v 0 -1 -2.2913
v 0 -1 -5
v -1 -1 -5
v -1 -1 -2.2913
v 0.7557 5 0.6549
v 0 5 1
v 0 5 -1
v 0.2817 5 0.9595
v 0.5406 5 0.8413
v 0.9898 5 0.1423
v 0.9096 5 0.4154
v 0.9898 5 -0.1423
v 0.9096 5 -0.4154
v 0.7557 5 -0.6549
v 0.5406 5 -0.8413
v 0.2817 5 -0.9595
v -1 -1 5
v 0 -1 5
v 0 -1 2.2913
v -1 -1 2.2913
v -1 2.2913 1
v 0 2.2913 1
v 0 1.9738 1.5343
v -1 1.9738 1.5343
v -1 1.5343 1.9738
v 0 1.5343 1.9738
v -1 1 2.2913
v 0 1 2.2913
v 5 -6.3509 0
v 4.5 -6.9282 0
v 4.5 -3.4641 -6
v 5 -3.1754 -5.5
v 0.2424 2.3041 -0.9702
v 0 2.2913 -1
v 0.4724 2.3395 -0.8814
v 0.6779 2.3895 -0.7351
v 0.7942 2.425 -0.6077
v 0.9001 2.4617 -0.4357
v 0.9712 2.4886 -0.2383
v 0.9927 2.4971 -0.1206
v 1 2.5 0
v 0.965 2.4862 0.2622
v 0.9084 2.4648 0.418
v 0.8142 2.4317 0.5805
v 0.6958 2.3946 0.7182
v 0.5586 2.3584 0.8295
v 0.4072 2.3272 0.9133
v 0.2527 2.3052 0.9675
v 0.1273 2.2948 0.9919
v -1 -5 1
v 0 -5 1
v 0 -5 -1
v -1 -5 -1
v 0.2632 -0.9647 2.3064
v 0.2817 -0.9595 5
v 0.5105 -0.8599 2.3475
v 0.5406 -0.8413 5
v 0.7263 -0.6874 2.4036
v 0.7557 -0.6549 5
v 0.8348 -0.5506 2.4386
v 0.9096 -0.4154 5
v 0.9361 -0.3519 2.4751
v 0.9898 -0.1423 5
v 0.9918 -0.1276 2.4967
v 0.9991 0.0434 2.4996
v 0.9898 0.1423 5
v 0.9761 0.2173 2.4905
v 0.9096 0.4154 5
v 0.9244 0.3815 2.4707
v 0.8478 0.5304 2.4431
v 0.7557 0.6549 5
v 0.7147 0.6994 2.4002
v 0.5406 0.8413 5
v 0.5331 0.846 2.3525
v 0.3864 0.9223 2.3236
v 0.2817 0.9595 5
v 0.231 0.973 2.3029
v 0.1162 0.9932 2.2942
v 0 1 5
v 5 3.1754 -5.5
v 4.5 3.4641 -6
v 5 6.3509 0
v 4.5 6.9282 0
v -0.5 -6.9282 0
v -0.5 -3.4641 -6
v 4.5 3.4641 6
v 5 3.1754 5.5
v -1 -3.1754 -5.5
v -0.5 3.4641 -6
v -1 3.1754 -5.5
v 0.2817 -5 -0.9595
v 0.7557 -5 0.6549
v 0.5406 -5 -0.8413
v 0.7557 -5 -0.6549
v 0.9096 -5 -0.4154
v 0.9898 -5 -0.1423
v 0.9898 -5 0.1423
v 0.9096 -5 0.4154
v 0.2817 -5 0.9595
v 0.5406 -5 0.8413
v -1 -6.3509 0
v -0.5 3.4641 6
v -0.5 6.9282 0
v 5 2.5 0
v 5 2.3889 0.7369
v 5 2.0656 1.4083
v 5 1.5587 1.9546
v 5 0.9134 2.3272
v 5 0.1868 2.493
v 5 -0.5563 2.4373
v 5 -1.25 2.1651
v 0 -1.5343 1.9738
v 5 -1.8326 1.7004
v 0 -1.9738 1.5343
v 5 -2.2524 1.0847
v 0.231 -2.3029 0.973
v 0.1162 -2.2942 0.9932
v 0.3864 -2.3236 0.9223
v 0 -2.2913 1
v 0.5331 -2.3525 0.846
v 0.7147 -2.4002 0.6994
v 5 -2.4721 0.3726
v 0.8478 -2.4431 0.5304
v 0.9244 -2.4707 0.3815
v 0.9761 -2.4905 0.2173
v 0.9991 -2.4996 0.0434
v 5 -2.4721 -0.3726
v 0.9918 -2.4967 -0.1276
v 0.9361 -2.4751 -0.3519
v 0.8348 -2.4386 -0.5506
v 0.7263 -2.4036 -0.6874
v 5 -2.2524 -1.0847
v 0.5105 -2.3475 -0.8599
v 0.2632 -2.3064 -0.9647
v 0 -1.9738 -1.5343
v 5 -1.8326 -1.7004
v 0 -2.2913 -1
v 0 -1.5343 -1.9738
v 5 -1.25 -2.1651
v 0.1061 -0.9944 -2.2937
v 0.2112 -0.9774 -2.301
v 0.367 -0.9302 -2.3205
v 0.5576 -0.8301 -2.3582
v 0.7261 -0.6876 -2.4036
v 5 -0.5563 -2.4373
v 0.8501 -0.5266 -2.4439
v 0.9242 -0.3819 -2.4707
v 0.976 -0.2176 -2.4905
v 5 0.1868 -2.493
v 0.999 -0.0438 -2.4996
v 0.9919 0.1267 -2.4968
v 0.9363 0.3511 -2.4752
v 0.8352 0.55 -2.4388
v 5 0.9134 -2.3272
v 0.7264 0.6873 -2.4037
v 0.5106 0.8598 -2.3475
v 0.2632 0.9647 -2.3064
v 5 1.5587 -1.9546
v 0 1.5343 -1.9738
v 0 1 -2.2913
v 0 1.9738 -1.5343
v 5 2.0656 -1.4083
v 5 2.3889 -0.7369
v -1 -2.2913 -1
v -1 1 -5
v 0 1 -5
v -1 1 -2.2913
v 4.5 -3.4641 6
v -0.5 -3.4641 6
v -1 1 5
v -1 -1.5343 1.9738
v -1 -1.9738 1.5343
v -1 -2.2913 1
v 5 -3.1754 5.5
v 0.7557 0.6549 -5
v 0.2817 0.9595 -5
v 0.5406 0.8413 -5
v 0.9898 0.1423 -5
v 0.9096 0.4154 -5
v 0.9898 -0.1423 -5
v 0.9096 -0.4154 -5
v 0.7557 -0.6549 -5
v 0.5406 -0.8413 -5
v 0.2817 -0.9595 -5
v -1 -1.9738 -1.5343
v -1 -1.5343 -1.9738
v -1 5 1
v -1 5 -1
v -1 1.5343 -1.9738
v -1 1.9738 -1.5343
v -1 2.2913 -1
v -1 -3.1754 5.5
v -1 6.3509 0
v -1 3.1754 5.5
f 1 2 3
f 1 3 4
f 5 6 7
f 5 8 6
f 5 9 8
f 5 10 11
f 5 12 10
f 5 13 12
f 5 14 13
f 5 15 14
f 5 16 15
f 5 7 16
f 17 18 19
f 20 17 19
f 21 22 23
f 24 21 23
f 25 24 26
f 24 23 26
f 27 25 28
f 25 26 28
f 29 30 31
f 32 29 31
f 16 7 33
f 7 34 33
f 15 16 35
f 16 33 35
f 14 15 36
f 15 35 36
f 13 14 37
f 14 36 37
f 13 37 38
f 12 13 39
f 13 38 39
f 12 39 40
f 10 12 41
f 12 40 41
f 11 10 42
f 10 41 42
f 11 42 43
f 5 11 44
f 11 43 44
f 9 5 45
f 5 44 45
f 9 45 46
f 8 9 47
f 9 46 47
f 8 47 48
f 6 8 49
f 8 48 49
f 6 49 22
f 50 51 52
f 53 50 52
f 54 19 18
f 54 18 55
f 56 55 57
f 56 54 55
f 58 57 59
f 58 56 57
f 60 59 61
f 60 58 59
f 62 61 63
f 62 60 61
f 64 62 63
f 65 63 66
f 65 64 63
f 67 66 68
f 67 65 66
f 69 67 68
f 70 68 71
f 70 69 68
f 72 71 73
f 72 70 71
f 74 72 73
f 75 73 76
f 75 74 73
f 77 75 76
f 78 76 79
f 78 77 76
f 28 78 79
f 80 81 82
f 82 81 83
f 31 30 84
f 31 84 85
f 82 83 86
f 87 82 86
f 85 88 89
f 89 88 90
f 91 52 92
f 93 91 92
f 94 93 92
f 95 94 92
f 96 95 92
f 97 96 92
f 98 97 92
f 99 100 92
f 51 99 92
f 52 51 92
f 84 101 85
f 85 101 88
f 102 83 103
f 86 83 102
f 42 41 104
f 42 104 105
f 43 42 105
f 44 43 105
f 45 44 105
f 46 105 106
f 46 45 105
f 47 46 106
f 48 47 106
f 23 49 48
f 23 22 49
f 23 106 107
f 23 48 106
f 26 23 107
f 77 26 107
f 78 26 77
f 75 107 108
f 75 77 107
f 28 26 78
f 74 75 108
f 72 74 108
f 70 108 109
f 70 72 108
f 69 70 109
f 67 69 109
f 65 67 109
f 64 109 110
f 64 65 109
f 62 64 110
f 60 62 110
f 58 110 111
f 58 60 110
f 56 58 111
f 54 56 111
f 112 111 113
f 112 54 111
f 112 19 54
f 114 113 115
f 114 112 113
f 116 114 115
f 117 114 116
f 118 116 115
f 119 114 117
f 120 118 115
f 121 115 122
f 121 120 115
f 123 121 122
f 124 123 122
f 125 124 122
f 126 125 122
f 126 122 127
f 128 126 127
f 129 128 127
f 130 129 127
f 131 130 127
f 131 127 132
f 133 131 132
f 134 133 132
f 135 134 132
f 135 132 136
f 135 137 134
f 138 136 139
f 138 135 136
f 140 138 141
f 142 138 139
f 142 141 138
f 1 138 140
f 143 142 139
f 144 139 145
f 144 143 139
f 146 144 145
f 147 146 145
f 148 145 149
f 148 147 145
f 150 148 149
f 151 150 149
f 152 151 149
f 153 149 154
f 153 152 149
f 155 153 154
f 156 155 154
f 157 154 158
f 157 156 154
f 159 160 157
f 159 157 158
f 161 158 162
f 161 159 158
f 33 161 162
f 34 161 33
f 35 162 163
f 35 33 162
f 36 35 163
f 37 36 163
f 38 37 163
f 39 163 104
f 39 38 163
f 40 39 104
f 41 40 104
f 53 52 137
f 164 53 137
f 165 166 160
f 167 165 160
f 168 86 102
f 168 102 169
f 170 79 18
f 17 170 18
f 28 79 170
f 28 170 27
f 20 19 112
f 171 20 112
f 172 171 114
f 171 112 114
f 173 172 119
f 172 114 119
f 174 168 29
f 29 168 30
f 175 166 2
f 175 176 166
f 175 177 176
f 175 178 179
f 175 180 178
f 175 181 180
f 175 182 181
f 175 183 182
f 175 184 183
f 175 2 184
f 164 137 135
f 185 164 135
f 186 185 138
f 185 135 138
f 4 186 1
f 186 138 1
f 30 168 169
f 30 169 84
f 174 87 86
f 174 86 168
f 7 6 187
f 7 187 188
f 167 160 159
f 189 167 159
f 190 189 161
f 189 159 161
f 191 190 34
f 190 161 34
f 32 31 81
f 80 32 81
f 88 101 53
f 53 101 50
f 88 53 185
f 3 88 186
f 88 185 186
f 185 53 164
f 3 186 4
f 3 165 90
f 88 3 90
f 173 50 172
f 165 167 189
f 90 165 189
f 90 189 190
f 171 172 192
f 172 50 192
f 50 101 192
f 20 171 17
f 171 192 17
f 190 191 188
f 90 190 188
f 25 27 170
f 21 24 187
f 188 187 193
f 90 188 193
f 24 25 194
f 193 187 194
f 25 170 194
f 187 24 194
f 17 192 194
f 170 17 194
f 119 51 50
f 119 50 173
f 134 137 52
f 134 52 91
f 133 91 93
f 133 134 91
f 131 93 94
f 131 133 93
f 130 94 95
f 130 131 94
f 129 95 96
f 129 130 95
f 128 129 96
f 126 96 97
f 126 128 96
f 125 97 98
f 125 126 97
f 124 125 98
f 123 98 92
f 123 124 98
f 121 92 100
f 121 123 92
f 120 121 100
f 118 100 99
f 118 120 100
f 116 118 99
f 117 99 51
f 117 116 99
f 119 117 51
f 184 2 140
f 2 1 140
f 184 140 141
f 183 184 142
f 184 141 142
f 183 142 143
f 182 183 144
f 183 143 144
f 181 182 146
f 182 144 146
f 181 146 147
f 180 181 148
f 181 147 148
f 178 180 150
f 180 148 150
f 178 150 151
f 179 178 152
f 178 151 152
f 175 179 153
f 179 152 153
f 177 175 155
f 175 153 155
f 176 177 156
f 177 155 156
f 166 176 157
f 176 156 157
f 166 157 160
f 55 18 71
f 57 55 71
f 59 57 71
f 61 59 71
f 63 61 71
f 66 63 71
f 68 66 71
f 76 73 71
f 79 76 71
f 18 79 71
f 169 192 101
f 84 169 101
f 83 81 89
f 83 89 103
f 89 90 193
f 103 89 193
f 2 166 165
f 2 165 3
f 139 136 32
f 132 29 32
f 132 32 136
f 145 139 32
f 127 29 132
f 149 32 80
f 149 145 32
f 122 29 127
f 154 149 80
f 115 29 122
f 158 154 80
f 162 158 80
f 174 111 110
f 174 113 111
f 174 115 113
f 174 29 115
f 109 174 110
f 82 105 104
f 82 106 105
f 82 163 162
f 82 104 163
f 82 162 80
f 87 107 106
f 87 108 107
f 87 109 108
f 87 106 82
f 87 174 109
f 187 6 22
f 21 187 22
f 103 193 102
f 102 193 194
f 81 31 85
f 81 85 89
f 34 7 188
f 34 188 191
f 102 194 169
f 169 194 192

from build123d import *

# Parameters (mm, degrees)
F0_R     = 2.5
F3_DEPTH = 5
F1_R     = 1
F4_DEPTH = 5
F5_DEPTH = 5
F2_R     = 1
F6_DEPTH = 5
F7_DEPTH = 5
F8_SIZE  = 0.5
F9_DEPTH = 1
F10_SIZE = 0.5


with BuildPart() as f3:
    # F0 (on Right) → F3 (new body)
    with BuildSketch(Plane.YZ):
        Polygon((3.4641016151, 6), (-3.4641016151, 6), (-6.9282032303, 0), (-3.4641016151, -6), (3.4641016151, -6), (6.9282032303, 0), align=None)
        Circle(F0_R, mode=Mode.SUBTRACT)
    extrude(amount=F3_DEPTH)

    # F1 (on Front) → F4 (cut)
    with BuildSketch(Plane.XZ):
        Circle(F1_R)
    extrude(amount=-F4_DEPTH, mode=Mode.SUBTRACT)

    # F1 (on Front) → F5 (cut)
    with BuildSketch(Plane.XZ):
        Circle(F1_R)
    extrude(amount=F5_DEPTH, mode=Mode.SUBTRACT)

    # F2 (on Top) → F6 (cut)
    with BuildSketch(Plane.XY):
        Circle(F2_R)
    extrude(amount=-F6_DEPTH, mode=Mode.SUBTRACT)

    # F2 (on Top) → F7 (cut)
    with BuildSketch(Plane.XY):
        Circle(F2_R)
    extrude(amount=F7_DEPTH, mode=Mode.SUBTRACT)

    # F8
    f8_edges = [f3.edges().sort_by_distance(p)[0] for p in [
        (5, 0, -6),
        (5, 5.196152, -3),
        (5, 5.196152, 3),
        (5, 0, 6),
        (5, -5.196152, 3),
        (5, -5.196152, -3),
    ]]
    chamfer(f8_edges, length=F8_SIZE)

    # F9 (add): a face of the model
    f9_faces = [f3.faces().sort_by_distance(p)[0] for p in [
        (0, 5.037407344, 2.9083484861),
    ]]
    extrude(f9_faces, amount=F9_DEPTH)

    # F10
    f10_edges = [f3.edges().sort_by_distance(p)[0] for p in [
        (-1, -5.196152, -3),
        (-1, 5.196152, -3),
        (-1, 0, -6),
        (-1, 0, 6),
        (-1, 5.196152, 3),
        (-1, -5.196152, 3),
    ]]
    chamfer(f10_edges, length=F10_SIZE)


solid = f3.part
